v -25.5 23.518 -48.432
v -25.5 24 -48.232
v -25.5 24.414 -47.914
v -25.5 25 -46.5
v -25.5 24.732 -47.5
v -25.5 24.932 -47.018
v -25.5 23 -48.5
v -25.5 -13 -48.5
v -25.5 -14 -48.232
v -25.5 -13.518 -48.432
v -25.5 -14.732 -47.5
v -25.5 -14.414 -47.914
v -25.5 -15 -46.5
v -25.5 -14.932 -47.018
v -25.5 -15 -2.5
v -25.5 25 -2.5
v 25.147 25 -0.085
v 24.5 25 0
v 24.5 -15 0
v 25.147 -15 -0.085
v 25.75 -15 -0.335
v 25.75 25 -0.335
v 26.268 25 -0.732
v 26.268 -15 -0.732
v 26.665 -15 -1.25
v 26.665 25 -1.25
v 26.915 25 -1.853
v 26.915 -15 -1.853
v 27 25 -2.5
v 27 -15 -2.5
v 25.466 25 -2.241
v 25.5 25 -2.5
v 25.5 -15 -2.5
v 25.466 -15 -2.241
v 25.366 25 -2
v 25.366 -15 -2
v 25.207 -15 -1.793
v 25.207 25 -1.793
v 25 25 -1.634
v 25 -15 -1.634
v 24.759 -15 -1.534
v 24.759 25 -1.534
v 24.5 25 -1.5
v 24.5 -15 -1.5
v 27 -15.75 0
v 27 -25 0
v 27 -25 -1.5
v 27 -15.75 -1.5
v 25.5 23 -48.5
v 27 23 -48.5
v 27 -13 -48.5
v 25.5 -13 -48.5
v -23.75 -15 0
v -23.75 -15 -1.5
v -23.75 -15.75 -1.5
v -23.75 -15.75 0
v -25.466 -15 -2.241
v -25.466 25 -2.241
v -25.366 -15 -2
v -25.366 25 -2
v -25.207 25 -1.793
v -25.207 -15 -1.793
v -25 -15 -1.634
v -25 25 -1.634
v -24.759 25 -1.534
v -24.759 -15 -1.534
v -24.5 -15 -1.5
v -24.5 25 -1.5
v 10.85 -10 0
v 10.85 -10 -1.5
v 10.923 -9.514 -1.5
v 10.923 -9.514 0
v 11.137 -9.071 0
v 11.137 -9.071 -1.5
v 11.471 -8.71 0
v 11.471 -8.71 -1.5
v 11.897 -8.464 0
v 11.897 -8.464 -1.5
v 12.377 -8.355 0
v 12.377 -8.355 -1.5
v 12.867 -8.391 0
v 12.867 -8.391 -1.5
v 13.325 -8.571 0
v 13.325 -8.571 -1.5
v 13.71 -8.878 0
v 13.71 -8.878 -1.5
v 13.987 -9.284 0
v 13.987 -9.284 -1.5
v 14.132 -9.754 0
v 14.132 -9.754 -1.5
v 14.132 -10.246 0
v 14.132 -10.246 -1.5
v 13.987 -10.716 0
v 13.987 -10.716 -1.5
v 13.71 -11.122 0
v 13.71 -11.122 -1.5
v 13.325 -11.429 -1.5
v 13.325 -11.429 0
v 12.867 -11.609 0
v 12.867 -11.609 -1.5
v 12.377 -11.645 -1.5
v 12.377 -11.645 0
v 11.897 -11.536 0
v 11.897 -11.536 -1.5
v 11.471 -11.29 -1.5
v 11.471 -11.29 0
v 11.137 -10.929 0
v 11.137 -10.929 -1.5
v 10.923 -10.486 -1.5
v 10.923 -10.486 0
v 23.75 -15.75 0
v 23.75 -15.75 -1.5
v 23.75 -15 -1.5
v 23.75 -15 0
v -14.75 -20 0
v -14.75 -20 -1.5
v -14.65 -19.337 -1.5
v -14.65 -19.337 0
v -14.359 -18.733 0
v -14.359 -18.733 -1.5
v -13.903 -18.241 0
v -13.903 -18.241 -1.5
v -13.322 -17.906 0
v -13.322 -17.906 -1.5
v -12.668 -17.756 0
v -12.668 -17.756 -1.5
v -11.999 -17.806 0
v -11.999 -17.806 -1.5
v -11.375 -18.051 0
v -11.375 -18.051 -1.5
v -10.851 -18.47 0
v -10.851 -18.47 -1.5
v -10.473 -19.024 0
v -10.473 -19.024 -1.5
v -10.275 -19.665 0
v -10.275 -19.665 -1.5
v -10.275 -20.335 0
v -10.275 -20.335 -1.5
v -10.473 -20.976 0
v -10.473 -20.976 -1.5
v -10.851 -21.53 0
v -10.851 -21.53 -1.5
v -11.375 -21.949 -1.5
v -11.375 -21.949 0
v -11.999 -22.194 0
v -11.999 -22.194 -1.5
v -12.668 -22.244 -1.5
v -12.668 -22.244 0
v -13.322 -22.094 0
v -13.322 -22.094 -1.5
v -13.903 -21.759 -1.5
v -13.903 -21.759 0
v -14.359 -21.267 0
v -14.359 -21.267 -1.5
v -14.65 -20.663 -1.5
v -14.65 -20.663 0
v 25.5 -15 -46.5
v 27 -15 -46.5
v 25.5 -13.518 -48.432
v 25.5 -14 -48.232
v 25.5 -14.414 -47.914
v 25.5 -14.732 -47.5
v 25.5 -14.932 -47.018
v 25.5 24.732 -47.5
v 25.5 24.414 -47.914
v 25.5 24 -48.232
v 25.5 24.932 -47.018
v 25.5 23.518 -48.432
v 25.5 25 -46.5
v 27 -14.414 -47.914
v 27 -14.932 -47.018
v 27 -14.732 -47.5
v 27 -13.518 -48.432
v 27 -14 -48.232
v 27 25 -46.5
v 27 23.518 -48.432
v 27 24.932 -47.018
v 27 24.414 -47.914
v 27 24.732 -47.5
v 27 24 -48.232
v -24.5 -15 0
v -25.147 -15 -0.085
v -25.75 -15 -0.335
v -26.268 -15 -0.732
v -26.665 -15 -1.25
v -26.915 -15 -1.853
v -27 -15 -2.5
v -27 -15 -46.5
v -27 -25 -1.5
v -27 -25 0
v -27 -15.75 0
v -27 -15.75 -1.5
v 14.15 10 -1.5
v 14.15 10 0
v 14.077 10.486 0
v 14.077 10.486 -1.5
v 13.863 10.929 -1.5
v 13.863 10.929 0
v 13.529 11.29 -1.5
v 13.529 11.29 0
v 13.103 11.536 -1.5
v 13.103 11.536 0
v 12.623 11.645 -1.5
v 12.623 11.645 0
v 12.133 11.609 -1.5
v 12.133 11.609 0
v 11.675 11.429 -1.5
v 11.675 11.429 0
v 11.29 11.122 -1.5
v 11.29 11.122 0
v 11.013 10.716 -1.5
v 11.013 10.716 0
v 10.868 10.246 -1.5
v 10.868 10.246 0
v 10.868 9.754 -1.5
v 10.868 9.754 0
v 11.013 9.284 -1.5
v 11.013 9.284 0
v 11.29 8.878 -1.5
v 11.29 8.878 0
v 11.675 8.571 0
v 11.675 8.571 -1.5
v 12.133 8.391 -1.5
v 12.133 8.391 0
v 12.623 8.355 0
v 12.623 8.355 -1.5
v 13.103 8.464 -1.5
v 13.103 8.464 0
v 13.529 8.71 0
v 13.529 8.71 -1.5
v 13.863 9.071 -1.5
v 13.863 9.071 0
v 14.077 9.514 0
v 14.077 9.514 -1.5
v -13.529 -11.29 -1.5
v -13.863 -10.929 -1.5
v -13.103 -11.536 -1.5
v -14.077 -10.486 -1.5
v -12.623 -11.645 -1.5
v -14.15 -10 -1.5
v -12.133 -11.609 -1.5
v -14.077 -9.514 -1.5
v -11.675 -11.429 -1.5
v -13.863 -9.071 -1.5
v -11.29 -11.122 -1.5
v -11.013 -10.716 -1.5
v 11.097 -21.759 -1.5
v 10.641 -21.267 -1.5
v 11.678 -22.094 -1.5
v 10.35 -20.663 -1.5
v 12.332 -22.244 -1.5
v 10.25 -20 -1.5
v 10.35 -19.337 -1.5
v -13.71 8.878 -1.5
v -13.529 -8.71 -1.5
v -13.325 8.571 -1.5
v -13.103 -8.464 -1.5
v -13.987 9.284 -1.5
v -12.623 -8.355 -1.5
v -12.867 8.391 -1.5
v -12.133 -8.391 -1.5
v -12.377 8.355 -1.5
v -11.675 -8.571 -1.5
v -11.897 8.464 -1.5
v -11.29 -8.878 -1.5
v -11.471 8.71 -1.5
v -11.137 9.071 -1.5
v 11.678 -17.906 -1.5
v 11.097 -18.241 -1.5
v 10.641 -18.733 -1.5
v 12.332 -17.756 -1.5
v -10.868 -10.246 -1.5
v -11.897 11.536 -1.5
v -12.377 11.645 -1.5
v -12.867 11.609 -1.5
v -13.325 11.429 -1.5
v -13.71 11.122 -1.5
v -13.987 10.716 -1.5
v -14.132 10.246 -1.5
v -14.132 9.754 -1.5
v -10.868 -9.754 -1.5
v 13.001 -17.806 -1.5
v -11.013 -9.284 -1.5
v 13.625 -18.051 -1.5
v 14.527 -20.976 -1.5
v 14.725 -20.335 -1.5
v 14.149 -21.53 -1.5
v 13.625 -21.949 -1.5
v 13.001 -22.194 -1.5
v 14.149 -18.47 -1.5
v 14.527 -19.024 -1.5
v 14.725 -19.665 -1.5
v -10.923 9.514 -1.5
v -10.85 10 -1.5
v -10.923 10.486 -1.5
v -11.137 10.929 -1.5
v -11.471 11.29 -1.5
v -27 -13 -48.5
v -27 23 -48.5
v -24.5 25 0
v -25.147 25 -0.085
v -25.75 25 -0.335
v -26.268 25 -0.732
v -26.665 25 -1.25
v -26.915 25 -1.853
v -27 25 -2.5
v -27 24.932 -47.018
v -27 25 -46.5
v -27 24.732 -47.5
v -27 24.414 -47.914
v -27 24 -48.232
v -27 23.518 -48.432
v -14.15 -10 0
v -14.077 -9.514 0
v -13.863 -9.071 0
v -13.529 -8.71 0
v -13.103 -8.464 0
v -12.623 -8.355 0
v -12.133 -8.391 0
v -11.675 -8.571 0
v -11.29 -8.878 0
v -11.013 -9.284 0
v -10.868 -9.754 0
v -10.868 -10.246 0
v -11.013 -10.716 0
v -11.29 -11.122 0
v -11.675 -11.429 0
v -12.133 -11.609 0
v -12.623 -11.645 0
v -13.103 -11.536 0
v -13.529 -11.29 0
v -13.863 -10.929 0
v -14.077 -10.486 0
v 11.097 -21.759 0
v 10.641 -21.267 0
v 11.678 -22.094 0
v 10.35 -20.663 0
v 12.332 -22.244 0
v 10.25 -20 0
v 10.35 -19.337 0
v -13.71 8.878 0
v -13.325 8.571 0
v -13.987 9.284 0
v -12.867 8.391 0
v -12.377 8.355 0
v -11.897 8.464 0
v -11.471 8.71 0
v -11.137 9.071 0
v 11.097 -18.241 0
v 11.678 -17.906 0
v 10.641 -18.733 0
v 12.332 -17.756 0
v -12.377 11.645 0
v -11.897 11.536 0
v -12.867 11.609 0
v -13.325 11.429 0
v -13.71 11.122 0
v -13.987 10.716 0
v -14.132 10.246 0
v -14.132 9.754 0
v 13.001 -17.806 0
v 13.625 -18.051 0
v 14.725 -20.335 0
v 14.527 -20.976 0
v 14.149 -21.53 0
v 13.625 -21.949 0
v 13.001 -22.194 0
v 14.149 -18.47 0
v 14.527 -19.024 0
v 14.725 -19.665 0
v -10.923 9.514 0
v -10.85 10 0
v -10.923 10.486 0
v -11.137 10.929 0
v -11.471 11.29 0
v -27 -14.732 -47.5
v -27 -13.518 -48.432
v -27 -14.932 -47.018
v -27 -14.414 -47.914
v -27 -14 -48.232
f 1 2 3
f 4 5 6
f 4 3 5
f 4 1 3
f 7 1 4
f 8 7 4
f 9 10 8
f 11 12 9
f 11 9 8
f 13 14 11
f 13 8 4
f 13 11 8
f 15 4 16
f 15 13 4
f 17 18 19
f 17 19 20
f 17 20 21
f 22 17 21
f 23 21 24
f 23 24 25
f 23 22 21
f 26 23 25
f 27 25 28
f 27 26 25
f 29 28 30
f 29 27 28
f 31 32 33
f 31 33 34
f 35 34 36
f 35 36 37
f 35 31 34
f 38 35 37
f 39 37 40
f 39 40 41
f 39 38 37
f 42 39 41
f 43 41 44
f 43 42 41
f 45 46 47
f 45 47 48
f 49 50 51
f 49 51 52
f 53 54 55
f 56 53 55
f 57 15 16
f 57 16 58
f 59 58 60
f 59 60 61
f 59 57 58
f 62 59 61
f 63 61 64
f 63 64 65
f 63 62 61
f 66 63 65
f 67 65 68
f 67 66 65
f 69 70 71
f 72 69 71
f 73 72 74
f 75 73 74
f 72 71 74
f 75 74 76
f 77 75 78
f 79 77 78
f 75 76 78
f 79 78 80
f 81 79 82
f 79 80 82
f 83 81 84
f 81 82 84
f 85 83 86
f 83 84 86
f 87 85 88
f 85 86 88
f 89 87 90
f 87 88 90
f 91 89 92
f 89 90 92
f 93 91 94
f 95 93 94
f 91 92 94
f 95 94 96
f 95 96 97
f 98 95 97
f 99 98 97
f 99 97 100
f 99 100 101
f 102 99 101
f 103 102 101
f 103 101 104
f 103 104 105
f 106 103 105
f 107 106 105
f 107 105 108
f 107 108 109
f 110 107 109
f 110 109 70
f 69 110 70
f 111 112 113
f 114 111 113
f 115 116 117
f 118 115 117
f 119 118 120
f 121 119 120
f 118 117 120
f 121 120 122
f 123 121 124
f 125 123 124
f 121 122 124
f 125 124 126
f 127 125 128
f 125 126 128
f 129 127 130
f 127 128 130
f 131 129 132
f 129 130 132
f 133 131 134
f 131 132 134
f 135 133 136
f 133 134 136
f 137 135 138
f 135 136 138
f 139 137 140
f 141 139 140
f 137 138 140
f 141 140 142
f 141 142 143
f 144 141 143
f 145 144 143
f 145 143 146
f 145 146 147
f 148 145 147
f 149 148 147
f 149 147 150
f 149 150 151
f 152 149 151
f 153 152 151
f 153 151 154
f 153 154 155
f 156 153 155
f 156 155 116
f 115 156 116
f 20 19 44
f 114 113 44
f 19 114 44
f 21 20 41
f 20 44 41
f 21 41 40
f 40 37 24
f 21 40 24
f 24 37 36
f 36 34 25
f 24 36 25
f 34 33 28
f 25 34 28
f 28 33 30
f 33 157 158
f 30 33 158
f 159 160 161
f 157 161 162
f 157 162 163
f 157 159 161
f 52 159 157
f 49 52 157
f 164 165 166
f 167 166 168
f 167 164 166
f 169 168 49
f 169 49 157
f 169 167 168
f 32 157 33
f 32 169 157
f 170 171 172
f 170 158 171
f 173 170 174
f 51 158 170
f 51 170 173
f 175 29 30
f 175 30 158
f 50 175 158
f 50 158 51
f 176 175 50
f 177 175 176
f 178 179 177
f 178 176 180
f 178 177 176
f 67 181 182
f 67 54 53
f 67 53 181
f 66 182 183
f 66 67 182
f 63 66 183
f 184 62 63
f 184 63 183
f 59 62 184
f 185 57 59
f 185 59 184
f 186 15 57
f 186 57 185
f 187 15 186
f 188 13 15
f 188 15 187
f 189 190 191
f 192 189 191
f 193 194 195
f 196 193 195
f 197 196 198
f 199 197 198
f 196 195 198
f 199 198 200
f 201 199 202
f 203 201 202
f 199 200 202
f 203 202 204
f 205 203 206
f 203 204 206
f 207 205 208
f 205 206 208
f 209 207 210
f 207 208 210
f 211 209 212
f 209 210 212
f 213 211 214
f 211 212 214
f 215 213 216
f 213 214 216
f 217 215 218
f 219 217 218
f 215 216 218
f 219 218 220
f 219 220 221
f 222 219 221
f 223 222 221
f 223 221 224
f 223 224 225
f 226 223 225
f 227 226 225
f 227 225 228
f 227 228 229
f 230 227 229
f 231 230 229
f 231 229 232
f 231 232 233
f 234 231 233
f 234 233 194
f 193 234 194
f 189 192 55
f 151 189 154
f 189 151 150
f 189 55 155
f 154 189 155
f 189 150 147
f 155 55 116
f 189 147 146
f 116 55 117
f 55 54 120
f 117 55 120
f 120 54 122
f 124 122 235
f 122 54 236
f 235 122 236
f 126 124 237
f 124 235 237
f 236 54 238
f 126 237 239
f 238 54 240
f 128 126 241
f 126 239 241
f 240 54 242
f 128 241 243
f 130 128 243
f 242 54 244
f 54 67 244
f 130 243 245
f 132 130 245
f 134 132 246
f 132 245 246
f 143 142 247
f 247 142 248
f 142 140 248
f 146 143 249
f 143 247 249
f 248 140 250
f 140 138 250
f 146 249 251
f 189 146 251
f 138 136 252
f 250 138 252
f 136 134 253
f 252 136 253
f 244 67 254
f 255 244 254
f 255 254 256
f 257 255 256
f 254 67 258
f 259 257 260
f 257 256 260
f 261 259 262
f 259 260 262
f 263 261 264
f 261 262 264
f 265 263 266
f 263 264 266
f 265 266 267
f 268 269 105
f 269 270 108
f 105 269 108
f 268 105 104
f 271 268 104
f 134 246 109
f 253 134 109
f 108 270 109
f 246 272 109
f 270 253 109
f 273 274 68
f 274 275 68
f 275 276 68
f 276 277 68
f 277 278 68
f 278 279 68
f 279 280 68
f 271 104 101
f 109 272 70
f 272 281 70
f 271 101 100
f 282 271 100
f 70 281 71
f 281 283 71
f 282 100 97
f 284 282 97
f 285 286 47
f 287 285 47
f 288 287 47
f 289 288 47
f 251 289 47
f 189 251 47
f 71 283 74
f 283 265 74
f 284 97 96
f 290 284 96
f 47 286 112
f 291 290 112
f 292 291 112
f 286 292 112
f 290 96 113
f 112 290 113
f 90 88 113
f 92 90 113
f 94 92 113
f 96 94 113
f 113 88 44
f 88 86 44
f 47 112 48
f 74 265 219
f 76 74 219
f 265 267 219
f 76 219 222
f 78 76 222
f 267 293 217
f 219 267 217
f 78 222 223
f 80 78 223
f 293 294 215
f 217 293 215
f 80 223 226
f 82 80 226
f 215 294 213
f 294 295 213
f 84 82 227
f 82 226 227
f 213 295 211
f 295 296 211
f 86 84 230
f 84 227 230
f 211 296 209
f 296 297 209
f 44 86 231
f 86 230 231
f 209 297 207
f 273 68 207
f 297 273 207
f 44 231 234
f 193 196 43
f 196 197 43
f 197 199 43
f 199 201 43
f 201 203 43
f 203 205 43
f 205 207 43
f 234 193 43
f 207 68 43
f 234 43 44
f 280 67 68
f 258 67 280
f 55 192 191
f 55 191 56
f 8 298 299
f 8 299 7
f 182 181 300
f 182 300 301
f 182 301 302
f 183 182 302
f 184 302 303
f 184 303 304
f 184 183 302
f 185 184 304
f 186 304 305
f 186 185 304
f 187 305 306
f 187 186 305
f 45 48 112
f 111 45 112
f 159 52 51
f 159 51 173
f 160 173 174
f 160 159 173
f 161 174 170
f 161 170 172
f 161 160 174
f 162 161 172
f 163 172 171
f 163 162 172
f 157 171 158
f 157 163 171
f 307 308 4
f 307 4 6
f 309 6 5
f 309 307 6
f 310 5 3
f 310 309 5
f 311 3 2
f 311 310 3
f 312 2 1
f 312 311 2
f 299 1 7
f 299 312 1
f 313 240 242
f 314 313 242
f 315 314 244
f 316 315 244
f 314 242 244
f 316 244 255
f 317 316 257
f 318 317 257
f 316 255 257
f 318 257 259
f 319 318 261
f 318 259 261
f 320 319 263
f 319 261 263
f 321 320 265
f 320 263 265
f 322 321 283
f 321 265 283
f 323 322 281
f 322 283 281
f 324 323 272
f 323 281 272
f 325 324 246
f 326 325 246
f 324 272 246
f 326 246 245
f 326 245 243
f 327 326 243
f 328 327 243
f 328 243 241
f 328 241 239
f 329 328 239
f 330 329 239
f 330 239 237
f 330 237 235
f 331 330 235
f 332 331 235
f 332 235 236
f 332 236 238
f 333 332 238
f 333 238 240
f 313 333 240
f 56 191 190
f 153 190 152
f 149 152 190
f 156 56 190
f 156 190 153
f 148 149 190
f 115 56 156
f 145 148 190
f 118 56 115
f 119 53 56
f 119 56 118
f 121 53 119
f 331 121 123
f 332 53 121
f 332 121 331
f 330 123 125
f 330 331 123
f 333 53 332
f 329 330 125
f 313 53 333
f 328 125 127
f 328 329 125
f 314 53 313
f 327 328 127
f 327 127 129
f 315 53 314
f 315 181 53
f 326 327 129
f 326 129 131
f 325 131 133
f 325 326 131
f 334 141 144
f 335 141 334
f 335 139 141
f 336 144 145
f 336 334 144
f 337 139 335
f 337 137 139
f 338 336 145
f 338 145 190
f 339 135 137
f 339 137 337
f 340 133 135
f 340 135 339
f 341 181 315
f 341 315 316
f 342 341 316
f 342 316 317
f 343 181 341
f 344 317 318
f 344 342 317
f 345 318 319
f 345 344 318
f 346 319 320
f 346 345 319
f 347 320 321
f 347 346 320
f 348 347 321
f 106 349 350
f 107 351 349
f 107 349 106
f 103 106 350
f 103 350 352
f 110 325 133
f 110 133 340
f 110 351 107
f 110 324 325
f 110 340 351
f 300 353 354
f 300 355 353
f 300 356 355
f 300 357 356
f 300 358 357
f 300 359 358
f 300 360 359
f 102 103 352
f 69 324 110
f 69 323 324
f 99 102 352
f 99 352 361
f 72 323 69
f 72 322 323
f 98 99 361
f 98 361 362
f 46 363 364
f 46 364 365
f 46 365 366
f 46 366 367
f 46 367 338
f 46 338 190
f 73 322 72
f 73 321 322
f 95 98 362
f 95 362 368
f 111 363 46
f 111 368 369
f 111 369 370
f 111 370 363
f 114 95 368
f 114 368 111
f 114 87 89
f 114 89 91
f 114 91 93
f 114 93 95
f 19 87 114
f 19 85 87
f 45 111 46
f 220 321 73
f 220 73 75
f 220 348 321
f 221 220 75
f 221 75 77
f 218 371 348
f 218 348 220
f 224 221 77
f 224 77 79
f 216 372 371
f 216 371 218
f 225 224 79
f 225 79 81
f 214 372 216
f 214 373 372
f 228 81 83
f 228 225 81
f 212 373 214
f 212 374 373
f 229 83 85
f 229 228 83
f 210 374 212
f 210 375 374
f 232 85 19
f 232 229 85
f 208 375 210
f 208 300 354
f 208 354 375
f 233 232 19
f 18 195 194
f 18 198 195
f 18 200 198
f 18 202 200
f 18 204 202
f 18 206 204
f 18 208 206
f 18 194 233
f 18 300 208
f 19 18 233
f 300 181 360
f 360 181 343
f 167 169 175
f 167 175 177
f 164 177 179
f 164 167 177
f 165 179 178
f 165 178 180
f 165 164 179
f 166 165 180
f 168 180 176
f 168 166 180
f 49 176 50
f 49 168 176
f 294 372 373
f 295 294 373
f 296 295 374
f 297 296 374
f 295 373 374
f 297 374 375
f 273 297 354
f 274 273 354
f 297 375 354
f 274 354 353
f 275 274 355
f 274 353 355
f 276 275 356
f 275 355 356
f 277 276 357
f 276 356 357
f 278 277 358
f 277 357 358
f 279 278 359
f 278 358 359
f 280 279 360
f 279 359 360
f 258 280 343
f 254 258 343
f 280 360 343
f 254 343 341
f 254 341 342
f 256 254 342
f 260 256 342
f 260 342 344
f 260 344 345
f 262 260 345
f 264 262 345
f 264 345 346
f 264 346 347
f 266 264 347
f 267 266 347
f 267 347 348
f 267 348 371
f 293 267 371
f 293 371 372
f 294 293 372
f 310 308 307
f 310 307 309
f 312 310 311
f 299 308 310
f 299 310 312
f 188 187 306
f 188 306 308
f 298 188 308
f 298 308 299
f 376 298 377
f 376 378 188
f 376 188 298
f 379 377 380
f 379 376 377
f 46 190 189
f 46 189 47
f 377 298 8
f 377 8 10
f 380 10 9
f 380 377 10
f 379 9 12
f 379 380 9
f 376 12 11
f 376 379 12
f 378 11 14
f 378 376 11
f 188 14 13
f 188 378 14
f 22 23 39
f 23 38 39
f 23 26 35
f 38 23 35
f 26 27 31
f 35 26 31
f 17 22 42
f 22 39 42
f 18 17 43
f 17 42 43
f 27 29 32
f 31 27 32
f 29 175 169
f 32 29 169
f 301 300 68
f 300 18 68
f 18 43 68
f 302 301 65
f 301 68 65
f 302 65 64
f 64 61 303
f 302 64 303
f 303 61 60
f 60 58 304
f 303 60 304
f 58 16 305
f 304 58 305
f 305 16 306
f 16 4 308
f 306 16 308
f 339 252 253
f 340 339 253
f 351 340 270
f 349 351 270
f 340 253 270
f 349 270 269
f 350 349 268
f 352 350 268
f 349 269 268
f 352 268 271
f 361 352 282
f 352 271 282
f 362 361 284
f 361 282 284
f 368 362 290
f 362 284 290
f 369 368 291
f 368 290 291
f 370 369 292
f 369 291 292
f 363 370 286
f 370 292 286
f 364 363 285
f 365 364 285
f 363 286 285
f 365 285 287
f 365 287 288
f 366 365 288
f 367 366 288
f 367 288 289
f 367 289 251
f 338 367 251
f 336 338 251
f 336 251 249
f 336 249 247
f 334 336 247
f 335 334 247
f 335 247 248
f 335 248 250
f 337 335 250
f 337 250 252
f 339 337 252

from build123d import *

# Parameters (mm, degrees)
SKETCH_1_W                          = 54
SKETCH_1_H                          = 50
SM_BASE_FLANGE_1_DEPTH              = 1.5
SM_EDGE_FLANGE_1_STRIP_W            = 8
SM_EDGE_FLANGE_1_STRIP_H            = 1.5
SM_EDGE_FLANGE_1_STRIP_CUT_DEPTH    = 40
SM_EDGE_FLANGE_1_RELIEF_W           = 8.75
SM_EDGE_FLANGE_1_RELIEF_H           = 0.75
SM_EDGE_FLANGE_1_RELIEF_CUT_DEPTH   = 1.5
SM_EDGE_FLANGE_1_STRIP_2_W          = 8
SM_EDGE_FLANGE_1_STRIP_2_H          = 1.5
SM_EDGE_FLANGE_1_STRIP_CUT_2_DEPTH  = 40
SM_EDGE_FLANGE_1_RELIEF_2_W         = 8.75
SM_EDGE_FLANGE_1_RELIEF_2_H         = 0.75
SM_EDGE_FLANGE_1_RELIEF_CUT_2_DEPTH = 1.5
SM_EDGE_FLANGE_1_DEPTH              = 40
SM_EDGE_FLANGE_1_BEND_DEPTH         = 40
HOLE_WIZARD_M4_1_D                  = 4.5
HOLE_WIZARD_M4_1_2_D                = 3.3
HOLE_WIZARD_M4_1_3_D                = 3.3
OTHER_START                         = -27
OTHER_1_DEPTH                       = 54


# Read off the part's stored shape, not the designer's step: 断开-边角1
# Sheet-metal steps are written as plain solids
with BuildPart() as part:
    # Sketch 1 → 基体-法兰1 (new body)
    with BuildSketch(Plane.XY):
        Rectangle(SKETCH_1_W, SKETCH_1_H)
    extrude(amount=-SM_BASE_FLANGE_1_DEPTH)

    # 边线-法兰1 strip (across the edge) → 边线-法兰1 strip cut (cut)
    with BuildSketch(Plane(origin=(27, 25, -1.5), x_dir=(-1, 0, 0), z_dir=(0, -1, 0))):
        with Locations((-1.5, -0.75)):
            Rectangle(SM_EDGE_FLANGE_1_STRIP_W, SM_EDGE_FLANGE_1_STRIP_H)
    extrude(amount=SM_EDGE_FLANGE_1_STRIP_CUT_DEPTH, mode=Mode.SUBTRACT)

    # 边线-法兰1 relief (on the sheet) → 边线-法兰1 relief cut (cut)
    with BuildSketch(Plane(origin=(24.5, 25, -1.5), x_dir=(-1, 0, 0), z_dir=(0, 0, -1))):
        with Locations((-3.625, -40.375)):
            Rectangle(SM_EDGE_FLANGE_1_RELIEF_W, SM_EDGE_FLANGE_1_RELIEF_H)
    extrude(amount=-SM_EDGE_FLANGE_1_RELIEF_CUT_DEPTH, mode=Mode.SUBTRACT)

    # 边线-法兰1 strip 2 (across the edge) → 边线-法兰1 strip cut 2 (cut)
    with BuildSketch(Plane(origin=(-27, -15, -1.5), x_dir=(1, 0, 0), z_dir=(0, 1, 0))):
        with Locations((-1.5, -0.75)):
            Rectangle(SM_EDGE_FLANGE_1_STRIP_2_W, SM_EDGE_FLANGE_1_STRIP_2_H)
    extrude(amount=SM_EDGE_FLANGE_1_STRIP_CUT_2_DEPTH, mode=Mode.SUBTRACT)

    # 边线-法兰1 relief 2 (on the sheet) → 边线-法兰1 relief cut 2 (cut)
    with BuildSketch(Plane(origin=(-24.5, -15, -1.5), x_dir=(1, 0, 0), z_dir=(0, 0, -1))):
        with Locations((-3.625, 0.375)):
            Rectangle(SM_EDGE_FLANGE_1_RELIEF_2_W, SM_EDGE_FLANGE_1_RELIEF_2_H)
    extrude(amount=-SM_EDGE_FLANGE_1_RELIEF_CUT_2_DEPTH, mode=Mode.SUBTRACT)

    # 边线-法兰1 section (across the edge) → 边线-法兰1 (add)
    with BuildSketch(Plane(origin=(27, 25, -1.5), x_dir=(-1, 0, 0), z_dir=(0, -1, 0))):
        with BuildLine():
            Line((0, 1), (0, 47))
            Line((0, 47), (1.5, 47))
            Line((1.5, 47), (1.5, 1))
            ThreePointArc((1.5, 1), (1.792893219, 0.292893219), (2.5, 0))
            Line((2.5, 0), (2.5, -1.5))
            ThreePointArc((2.5, -1.5), (0.732233047, -0.767766953), (0, 1))
        make_face()
    extrude(amount=SM_EDGE_FLANGE_1_DEPTH)

    # 边线-法兰1 section 2 (across the edge) → 边线-法兰1 bend (add)
    with BuildSketch(Plane(origin=(-27, -15, -1.5), x_dir=(1, 0, 0), z_dir=(0, 1, 0))):
        with BuildLine():
            Line((0, 1), (0, 47))
            Line((0, 47), (1.5, 47))
            Line((1.5, 47), (1.5, 1))
            ThreePointArc((1.5, 1), (1.792893219, 0.292893219), (2.5, 0))
            Line((2.5, 0), (2.5, -1.5))
            ThreePointArc((2.5, -1.5), (0.732233047, -0.767766953), (0, 1))
        make_face()
    extrude(amount=SM_EDGE_FLANGE_1_BEND_DEPTH)

    # Hole Wizard M4 _1 (through all)
    with Locations(Plane.XY):
        with Locations((-12.5, -20), (12.5, -20)):
            Hole(HOLE_WIZARD_M4_1_D / 2)

    # Hole Wizard M4 _1 2 (through all)
    with Locations(Plane(origin=(0, 0, -1.5), x_dir=(-1, 0, 0), z_dir=(0, 0, -1))):
        with Locations((-12.5, 10), (12.5, 10)):
            Hole(HOLE_WIZARD_M4_1_2_D / 2)

    # Hole Wizard M4 _1 3 (through all)
    with Locations(Plane.XY):
        with Locations((-12.5, -10), (12.5, -10)):
            Hole(HOLE_WIZARD_M4_1_3_D / 2)

    # Other 1 outline → Other 1 (cut)
    with BuildSketch(Plane.YZ.offset(OTHER_START)):
        with BuildLine():
            Line((-15, -48.5), (-13, -48.5))
            ThreePointArc((-13, -48.5), (-14.414213562, -47.914213562), (-15, -46.5))
            Line((-15, -46.5), (-15, -48.5))
        make_face()
        with BuildLine():
            ThreePointArc((25, -46.5), (24.414213562, -47.914213562), (23, -48.5))
            Line((23, -48.5), (25, -48.5))
            Line((25, -48.5), (25, -46.5))
        make_face()
    extrude(amount=OTHER_1_DEPTH, mode=Mode.SUBTRACT)


solid = part.part
